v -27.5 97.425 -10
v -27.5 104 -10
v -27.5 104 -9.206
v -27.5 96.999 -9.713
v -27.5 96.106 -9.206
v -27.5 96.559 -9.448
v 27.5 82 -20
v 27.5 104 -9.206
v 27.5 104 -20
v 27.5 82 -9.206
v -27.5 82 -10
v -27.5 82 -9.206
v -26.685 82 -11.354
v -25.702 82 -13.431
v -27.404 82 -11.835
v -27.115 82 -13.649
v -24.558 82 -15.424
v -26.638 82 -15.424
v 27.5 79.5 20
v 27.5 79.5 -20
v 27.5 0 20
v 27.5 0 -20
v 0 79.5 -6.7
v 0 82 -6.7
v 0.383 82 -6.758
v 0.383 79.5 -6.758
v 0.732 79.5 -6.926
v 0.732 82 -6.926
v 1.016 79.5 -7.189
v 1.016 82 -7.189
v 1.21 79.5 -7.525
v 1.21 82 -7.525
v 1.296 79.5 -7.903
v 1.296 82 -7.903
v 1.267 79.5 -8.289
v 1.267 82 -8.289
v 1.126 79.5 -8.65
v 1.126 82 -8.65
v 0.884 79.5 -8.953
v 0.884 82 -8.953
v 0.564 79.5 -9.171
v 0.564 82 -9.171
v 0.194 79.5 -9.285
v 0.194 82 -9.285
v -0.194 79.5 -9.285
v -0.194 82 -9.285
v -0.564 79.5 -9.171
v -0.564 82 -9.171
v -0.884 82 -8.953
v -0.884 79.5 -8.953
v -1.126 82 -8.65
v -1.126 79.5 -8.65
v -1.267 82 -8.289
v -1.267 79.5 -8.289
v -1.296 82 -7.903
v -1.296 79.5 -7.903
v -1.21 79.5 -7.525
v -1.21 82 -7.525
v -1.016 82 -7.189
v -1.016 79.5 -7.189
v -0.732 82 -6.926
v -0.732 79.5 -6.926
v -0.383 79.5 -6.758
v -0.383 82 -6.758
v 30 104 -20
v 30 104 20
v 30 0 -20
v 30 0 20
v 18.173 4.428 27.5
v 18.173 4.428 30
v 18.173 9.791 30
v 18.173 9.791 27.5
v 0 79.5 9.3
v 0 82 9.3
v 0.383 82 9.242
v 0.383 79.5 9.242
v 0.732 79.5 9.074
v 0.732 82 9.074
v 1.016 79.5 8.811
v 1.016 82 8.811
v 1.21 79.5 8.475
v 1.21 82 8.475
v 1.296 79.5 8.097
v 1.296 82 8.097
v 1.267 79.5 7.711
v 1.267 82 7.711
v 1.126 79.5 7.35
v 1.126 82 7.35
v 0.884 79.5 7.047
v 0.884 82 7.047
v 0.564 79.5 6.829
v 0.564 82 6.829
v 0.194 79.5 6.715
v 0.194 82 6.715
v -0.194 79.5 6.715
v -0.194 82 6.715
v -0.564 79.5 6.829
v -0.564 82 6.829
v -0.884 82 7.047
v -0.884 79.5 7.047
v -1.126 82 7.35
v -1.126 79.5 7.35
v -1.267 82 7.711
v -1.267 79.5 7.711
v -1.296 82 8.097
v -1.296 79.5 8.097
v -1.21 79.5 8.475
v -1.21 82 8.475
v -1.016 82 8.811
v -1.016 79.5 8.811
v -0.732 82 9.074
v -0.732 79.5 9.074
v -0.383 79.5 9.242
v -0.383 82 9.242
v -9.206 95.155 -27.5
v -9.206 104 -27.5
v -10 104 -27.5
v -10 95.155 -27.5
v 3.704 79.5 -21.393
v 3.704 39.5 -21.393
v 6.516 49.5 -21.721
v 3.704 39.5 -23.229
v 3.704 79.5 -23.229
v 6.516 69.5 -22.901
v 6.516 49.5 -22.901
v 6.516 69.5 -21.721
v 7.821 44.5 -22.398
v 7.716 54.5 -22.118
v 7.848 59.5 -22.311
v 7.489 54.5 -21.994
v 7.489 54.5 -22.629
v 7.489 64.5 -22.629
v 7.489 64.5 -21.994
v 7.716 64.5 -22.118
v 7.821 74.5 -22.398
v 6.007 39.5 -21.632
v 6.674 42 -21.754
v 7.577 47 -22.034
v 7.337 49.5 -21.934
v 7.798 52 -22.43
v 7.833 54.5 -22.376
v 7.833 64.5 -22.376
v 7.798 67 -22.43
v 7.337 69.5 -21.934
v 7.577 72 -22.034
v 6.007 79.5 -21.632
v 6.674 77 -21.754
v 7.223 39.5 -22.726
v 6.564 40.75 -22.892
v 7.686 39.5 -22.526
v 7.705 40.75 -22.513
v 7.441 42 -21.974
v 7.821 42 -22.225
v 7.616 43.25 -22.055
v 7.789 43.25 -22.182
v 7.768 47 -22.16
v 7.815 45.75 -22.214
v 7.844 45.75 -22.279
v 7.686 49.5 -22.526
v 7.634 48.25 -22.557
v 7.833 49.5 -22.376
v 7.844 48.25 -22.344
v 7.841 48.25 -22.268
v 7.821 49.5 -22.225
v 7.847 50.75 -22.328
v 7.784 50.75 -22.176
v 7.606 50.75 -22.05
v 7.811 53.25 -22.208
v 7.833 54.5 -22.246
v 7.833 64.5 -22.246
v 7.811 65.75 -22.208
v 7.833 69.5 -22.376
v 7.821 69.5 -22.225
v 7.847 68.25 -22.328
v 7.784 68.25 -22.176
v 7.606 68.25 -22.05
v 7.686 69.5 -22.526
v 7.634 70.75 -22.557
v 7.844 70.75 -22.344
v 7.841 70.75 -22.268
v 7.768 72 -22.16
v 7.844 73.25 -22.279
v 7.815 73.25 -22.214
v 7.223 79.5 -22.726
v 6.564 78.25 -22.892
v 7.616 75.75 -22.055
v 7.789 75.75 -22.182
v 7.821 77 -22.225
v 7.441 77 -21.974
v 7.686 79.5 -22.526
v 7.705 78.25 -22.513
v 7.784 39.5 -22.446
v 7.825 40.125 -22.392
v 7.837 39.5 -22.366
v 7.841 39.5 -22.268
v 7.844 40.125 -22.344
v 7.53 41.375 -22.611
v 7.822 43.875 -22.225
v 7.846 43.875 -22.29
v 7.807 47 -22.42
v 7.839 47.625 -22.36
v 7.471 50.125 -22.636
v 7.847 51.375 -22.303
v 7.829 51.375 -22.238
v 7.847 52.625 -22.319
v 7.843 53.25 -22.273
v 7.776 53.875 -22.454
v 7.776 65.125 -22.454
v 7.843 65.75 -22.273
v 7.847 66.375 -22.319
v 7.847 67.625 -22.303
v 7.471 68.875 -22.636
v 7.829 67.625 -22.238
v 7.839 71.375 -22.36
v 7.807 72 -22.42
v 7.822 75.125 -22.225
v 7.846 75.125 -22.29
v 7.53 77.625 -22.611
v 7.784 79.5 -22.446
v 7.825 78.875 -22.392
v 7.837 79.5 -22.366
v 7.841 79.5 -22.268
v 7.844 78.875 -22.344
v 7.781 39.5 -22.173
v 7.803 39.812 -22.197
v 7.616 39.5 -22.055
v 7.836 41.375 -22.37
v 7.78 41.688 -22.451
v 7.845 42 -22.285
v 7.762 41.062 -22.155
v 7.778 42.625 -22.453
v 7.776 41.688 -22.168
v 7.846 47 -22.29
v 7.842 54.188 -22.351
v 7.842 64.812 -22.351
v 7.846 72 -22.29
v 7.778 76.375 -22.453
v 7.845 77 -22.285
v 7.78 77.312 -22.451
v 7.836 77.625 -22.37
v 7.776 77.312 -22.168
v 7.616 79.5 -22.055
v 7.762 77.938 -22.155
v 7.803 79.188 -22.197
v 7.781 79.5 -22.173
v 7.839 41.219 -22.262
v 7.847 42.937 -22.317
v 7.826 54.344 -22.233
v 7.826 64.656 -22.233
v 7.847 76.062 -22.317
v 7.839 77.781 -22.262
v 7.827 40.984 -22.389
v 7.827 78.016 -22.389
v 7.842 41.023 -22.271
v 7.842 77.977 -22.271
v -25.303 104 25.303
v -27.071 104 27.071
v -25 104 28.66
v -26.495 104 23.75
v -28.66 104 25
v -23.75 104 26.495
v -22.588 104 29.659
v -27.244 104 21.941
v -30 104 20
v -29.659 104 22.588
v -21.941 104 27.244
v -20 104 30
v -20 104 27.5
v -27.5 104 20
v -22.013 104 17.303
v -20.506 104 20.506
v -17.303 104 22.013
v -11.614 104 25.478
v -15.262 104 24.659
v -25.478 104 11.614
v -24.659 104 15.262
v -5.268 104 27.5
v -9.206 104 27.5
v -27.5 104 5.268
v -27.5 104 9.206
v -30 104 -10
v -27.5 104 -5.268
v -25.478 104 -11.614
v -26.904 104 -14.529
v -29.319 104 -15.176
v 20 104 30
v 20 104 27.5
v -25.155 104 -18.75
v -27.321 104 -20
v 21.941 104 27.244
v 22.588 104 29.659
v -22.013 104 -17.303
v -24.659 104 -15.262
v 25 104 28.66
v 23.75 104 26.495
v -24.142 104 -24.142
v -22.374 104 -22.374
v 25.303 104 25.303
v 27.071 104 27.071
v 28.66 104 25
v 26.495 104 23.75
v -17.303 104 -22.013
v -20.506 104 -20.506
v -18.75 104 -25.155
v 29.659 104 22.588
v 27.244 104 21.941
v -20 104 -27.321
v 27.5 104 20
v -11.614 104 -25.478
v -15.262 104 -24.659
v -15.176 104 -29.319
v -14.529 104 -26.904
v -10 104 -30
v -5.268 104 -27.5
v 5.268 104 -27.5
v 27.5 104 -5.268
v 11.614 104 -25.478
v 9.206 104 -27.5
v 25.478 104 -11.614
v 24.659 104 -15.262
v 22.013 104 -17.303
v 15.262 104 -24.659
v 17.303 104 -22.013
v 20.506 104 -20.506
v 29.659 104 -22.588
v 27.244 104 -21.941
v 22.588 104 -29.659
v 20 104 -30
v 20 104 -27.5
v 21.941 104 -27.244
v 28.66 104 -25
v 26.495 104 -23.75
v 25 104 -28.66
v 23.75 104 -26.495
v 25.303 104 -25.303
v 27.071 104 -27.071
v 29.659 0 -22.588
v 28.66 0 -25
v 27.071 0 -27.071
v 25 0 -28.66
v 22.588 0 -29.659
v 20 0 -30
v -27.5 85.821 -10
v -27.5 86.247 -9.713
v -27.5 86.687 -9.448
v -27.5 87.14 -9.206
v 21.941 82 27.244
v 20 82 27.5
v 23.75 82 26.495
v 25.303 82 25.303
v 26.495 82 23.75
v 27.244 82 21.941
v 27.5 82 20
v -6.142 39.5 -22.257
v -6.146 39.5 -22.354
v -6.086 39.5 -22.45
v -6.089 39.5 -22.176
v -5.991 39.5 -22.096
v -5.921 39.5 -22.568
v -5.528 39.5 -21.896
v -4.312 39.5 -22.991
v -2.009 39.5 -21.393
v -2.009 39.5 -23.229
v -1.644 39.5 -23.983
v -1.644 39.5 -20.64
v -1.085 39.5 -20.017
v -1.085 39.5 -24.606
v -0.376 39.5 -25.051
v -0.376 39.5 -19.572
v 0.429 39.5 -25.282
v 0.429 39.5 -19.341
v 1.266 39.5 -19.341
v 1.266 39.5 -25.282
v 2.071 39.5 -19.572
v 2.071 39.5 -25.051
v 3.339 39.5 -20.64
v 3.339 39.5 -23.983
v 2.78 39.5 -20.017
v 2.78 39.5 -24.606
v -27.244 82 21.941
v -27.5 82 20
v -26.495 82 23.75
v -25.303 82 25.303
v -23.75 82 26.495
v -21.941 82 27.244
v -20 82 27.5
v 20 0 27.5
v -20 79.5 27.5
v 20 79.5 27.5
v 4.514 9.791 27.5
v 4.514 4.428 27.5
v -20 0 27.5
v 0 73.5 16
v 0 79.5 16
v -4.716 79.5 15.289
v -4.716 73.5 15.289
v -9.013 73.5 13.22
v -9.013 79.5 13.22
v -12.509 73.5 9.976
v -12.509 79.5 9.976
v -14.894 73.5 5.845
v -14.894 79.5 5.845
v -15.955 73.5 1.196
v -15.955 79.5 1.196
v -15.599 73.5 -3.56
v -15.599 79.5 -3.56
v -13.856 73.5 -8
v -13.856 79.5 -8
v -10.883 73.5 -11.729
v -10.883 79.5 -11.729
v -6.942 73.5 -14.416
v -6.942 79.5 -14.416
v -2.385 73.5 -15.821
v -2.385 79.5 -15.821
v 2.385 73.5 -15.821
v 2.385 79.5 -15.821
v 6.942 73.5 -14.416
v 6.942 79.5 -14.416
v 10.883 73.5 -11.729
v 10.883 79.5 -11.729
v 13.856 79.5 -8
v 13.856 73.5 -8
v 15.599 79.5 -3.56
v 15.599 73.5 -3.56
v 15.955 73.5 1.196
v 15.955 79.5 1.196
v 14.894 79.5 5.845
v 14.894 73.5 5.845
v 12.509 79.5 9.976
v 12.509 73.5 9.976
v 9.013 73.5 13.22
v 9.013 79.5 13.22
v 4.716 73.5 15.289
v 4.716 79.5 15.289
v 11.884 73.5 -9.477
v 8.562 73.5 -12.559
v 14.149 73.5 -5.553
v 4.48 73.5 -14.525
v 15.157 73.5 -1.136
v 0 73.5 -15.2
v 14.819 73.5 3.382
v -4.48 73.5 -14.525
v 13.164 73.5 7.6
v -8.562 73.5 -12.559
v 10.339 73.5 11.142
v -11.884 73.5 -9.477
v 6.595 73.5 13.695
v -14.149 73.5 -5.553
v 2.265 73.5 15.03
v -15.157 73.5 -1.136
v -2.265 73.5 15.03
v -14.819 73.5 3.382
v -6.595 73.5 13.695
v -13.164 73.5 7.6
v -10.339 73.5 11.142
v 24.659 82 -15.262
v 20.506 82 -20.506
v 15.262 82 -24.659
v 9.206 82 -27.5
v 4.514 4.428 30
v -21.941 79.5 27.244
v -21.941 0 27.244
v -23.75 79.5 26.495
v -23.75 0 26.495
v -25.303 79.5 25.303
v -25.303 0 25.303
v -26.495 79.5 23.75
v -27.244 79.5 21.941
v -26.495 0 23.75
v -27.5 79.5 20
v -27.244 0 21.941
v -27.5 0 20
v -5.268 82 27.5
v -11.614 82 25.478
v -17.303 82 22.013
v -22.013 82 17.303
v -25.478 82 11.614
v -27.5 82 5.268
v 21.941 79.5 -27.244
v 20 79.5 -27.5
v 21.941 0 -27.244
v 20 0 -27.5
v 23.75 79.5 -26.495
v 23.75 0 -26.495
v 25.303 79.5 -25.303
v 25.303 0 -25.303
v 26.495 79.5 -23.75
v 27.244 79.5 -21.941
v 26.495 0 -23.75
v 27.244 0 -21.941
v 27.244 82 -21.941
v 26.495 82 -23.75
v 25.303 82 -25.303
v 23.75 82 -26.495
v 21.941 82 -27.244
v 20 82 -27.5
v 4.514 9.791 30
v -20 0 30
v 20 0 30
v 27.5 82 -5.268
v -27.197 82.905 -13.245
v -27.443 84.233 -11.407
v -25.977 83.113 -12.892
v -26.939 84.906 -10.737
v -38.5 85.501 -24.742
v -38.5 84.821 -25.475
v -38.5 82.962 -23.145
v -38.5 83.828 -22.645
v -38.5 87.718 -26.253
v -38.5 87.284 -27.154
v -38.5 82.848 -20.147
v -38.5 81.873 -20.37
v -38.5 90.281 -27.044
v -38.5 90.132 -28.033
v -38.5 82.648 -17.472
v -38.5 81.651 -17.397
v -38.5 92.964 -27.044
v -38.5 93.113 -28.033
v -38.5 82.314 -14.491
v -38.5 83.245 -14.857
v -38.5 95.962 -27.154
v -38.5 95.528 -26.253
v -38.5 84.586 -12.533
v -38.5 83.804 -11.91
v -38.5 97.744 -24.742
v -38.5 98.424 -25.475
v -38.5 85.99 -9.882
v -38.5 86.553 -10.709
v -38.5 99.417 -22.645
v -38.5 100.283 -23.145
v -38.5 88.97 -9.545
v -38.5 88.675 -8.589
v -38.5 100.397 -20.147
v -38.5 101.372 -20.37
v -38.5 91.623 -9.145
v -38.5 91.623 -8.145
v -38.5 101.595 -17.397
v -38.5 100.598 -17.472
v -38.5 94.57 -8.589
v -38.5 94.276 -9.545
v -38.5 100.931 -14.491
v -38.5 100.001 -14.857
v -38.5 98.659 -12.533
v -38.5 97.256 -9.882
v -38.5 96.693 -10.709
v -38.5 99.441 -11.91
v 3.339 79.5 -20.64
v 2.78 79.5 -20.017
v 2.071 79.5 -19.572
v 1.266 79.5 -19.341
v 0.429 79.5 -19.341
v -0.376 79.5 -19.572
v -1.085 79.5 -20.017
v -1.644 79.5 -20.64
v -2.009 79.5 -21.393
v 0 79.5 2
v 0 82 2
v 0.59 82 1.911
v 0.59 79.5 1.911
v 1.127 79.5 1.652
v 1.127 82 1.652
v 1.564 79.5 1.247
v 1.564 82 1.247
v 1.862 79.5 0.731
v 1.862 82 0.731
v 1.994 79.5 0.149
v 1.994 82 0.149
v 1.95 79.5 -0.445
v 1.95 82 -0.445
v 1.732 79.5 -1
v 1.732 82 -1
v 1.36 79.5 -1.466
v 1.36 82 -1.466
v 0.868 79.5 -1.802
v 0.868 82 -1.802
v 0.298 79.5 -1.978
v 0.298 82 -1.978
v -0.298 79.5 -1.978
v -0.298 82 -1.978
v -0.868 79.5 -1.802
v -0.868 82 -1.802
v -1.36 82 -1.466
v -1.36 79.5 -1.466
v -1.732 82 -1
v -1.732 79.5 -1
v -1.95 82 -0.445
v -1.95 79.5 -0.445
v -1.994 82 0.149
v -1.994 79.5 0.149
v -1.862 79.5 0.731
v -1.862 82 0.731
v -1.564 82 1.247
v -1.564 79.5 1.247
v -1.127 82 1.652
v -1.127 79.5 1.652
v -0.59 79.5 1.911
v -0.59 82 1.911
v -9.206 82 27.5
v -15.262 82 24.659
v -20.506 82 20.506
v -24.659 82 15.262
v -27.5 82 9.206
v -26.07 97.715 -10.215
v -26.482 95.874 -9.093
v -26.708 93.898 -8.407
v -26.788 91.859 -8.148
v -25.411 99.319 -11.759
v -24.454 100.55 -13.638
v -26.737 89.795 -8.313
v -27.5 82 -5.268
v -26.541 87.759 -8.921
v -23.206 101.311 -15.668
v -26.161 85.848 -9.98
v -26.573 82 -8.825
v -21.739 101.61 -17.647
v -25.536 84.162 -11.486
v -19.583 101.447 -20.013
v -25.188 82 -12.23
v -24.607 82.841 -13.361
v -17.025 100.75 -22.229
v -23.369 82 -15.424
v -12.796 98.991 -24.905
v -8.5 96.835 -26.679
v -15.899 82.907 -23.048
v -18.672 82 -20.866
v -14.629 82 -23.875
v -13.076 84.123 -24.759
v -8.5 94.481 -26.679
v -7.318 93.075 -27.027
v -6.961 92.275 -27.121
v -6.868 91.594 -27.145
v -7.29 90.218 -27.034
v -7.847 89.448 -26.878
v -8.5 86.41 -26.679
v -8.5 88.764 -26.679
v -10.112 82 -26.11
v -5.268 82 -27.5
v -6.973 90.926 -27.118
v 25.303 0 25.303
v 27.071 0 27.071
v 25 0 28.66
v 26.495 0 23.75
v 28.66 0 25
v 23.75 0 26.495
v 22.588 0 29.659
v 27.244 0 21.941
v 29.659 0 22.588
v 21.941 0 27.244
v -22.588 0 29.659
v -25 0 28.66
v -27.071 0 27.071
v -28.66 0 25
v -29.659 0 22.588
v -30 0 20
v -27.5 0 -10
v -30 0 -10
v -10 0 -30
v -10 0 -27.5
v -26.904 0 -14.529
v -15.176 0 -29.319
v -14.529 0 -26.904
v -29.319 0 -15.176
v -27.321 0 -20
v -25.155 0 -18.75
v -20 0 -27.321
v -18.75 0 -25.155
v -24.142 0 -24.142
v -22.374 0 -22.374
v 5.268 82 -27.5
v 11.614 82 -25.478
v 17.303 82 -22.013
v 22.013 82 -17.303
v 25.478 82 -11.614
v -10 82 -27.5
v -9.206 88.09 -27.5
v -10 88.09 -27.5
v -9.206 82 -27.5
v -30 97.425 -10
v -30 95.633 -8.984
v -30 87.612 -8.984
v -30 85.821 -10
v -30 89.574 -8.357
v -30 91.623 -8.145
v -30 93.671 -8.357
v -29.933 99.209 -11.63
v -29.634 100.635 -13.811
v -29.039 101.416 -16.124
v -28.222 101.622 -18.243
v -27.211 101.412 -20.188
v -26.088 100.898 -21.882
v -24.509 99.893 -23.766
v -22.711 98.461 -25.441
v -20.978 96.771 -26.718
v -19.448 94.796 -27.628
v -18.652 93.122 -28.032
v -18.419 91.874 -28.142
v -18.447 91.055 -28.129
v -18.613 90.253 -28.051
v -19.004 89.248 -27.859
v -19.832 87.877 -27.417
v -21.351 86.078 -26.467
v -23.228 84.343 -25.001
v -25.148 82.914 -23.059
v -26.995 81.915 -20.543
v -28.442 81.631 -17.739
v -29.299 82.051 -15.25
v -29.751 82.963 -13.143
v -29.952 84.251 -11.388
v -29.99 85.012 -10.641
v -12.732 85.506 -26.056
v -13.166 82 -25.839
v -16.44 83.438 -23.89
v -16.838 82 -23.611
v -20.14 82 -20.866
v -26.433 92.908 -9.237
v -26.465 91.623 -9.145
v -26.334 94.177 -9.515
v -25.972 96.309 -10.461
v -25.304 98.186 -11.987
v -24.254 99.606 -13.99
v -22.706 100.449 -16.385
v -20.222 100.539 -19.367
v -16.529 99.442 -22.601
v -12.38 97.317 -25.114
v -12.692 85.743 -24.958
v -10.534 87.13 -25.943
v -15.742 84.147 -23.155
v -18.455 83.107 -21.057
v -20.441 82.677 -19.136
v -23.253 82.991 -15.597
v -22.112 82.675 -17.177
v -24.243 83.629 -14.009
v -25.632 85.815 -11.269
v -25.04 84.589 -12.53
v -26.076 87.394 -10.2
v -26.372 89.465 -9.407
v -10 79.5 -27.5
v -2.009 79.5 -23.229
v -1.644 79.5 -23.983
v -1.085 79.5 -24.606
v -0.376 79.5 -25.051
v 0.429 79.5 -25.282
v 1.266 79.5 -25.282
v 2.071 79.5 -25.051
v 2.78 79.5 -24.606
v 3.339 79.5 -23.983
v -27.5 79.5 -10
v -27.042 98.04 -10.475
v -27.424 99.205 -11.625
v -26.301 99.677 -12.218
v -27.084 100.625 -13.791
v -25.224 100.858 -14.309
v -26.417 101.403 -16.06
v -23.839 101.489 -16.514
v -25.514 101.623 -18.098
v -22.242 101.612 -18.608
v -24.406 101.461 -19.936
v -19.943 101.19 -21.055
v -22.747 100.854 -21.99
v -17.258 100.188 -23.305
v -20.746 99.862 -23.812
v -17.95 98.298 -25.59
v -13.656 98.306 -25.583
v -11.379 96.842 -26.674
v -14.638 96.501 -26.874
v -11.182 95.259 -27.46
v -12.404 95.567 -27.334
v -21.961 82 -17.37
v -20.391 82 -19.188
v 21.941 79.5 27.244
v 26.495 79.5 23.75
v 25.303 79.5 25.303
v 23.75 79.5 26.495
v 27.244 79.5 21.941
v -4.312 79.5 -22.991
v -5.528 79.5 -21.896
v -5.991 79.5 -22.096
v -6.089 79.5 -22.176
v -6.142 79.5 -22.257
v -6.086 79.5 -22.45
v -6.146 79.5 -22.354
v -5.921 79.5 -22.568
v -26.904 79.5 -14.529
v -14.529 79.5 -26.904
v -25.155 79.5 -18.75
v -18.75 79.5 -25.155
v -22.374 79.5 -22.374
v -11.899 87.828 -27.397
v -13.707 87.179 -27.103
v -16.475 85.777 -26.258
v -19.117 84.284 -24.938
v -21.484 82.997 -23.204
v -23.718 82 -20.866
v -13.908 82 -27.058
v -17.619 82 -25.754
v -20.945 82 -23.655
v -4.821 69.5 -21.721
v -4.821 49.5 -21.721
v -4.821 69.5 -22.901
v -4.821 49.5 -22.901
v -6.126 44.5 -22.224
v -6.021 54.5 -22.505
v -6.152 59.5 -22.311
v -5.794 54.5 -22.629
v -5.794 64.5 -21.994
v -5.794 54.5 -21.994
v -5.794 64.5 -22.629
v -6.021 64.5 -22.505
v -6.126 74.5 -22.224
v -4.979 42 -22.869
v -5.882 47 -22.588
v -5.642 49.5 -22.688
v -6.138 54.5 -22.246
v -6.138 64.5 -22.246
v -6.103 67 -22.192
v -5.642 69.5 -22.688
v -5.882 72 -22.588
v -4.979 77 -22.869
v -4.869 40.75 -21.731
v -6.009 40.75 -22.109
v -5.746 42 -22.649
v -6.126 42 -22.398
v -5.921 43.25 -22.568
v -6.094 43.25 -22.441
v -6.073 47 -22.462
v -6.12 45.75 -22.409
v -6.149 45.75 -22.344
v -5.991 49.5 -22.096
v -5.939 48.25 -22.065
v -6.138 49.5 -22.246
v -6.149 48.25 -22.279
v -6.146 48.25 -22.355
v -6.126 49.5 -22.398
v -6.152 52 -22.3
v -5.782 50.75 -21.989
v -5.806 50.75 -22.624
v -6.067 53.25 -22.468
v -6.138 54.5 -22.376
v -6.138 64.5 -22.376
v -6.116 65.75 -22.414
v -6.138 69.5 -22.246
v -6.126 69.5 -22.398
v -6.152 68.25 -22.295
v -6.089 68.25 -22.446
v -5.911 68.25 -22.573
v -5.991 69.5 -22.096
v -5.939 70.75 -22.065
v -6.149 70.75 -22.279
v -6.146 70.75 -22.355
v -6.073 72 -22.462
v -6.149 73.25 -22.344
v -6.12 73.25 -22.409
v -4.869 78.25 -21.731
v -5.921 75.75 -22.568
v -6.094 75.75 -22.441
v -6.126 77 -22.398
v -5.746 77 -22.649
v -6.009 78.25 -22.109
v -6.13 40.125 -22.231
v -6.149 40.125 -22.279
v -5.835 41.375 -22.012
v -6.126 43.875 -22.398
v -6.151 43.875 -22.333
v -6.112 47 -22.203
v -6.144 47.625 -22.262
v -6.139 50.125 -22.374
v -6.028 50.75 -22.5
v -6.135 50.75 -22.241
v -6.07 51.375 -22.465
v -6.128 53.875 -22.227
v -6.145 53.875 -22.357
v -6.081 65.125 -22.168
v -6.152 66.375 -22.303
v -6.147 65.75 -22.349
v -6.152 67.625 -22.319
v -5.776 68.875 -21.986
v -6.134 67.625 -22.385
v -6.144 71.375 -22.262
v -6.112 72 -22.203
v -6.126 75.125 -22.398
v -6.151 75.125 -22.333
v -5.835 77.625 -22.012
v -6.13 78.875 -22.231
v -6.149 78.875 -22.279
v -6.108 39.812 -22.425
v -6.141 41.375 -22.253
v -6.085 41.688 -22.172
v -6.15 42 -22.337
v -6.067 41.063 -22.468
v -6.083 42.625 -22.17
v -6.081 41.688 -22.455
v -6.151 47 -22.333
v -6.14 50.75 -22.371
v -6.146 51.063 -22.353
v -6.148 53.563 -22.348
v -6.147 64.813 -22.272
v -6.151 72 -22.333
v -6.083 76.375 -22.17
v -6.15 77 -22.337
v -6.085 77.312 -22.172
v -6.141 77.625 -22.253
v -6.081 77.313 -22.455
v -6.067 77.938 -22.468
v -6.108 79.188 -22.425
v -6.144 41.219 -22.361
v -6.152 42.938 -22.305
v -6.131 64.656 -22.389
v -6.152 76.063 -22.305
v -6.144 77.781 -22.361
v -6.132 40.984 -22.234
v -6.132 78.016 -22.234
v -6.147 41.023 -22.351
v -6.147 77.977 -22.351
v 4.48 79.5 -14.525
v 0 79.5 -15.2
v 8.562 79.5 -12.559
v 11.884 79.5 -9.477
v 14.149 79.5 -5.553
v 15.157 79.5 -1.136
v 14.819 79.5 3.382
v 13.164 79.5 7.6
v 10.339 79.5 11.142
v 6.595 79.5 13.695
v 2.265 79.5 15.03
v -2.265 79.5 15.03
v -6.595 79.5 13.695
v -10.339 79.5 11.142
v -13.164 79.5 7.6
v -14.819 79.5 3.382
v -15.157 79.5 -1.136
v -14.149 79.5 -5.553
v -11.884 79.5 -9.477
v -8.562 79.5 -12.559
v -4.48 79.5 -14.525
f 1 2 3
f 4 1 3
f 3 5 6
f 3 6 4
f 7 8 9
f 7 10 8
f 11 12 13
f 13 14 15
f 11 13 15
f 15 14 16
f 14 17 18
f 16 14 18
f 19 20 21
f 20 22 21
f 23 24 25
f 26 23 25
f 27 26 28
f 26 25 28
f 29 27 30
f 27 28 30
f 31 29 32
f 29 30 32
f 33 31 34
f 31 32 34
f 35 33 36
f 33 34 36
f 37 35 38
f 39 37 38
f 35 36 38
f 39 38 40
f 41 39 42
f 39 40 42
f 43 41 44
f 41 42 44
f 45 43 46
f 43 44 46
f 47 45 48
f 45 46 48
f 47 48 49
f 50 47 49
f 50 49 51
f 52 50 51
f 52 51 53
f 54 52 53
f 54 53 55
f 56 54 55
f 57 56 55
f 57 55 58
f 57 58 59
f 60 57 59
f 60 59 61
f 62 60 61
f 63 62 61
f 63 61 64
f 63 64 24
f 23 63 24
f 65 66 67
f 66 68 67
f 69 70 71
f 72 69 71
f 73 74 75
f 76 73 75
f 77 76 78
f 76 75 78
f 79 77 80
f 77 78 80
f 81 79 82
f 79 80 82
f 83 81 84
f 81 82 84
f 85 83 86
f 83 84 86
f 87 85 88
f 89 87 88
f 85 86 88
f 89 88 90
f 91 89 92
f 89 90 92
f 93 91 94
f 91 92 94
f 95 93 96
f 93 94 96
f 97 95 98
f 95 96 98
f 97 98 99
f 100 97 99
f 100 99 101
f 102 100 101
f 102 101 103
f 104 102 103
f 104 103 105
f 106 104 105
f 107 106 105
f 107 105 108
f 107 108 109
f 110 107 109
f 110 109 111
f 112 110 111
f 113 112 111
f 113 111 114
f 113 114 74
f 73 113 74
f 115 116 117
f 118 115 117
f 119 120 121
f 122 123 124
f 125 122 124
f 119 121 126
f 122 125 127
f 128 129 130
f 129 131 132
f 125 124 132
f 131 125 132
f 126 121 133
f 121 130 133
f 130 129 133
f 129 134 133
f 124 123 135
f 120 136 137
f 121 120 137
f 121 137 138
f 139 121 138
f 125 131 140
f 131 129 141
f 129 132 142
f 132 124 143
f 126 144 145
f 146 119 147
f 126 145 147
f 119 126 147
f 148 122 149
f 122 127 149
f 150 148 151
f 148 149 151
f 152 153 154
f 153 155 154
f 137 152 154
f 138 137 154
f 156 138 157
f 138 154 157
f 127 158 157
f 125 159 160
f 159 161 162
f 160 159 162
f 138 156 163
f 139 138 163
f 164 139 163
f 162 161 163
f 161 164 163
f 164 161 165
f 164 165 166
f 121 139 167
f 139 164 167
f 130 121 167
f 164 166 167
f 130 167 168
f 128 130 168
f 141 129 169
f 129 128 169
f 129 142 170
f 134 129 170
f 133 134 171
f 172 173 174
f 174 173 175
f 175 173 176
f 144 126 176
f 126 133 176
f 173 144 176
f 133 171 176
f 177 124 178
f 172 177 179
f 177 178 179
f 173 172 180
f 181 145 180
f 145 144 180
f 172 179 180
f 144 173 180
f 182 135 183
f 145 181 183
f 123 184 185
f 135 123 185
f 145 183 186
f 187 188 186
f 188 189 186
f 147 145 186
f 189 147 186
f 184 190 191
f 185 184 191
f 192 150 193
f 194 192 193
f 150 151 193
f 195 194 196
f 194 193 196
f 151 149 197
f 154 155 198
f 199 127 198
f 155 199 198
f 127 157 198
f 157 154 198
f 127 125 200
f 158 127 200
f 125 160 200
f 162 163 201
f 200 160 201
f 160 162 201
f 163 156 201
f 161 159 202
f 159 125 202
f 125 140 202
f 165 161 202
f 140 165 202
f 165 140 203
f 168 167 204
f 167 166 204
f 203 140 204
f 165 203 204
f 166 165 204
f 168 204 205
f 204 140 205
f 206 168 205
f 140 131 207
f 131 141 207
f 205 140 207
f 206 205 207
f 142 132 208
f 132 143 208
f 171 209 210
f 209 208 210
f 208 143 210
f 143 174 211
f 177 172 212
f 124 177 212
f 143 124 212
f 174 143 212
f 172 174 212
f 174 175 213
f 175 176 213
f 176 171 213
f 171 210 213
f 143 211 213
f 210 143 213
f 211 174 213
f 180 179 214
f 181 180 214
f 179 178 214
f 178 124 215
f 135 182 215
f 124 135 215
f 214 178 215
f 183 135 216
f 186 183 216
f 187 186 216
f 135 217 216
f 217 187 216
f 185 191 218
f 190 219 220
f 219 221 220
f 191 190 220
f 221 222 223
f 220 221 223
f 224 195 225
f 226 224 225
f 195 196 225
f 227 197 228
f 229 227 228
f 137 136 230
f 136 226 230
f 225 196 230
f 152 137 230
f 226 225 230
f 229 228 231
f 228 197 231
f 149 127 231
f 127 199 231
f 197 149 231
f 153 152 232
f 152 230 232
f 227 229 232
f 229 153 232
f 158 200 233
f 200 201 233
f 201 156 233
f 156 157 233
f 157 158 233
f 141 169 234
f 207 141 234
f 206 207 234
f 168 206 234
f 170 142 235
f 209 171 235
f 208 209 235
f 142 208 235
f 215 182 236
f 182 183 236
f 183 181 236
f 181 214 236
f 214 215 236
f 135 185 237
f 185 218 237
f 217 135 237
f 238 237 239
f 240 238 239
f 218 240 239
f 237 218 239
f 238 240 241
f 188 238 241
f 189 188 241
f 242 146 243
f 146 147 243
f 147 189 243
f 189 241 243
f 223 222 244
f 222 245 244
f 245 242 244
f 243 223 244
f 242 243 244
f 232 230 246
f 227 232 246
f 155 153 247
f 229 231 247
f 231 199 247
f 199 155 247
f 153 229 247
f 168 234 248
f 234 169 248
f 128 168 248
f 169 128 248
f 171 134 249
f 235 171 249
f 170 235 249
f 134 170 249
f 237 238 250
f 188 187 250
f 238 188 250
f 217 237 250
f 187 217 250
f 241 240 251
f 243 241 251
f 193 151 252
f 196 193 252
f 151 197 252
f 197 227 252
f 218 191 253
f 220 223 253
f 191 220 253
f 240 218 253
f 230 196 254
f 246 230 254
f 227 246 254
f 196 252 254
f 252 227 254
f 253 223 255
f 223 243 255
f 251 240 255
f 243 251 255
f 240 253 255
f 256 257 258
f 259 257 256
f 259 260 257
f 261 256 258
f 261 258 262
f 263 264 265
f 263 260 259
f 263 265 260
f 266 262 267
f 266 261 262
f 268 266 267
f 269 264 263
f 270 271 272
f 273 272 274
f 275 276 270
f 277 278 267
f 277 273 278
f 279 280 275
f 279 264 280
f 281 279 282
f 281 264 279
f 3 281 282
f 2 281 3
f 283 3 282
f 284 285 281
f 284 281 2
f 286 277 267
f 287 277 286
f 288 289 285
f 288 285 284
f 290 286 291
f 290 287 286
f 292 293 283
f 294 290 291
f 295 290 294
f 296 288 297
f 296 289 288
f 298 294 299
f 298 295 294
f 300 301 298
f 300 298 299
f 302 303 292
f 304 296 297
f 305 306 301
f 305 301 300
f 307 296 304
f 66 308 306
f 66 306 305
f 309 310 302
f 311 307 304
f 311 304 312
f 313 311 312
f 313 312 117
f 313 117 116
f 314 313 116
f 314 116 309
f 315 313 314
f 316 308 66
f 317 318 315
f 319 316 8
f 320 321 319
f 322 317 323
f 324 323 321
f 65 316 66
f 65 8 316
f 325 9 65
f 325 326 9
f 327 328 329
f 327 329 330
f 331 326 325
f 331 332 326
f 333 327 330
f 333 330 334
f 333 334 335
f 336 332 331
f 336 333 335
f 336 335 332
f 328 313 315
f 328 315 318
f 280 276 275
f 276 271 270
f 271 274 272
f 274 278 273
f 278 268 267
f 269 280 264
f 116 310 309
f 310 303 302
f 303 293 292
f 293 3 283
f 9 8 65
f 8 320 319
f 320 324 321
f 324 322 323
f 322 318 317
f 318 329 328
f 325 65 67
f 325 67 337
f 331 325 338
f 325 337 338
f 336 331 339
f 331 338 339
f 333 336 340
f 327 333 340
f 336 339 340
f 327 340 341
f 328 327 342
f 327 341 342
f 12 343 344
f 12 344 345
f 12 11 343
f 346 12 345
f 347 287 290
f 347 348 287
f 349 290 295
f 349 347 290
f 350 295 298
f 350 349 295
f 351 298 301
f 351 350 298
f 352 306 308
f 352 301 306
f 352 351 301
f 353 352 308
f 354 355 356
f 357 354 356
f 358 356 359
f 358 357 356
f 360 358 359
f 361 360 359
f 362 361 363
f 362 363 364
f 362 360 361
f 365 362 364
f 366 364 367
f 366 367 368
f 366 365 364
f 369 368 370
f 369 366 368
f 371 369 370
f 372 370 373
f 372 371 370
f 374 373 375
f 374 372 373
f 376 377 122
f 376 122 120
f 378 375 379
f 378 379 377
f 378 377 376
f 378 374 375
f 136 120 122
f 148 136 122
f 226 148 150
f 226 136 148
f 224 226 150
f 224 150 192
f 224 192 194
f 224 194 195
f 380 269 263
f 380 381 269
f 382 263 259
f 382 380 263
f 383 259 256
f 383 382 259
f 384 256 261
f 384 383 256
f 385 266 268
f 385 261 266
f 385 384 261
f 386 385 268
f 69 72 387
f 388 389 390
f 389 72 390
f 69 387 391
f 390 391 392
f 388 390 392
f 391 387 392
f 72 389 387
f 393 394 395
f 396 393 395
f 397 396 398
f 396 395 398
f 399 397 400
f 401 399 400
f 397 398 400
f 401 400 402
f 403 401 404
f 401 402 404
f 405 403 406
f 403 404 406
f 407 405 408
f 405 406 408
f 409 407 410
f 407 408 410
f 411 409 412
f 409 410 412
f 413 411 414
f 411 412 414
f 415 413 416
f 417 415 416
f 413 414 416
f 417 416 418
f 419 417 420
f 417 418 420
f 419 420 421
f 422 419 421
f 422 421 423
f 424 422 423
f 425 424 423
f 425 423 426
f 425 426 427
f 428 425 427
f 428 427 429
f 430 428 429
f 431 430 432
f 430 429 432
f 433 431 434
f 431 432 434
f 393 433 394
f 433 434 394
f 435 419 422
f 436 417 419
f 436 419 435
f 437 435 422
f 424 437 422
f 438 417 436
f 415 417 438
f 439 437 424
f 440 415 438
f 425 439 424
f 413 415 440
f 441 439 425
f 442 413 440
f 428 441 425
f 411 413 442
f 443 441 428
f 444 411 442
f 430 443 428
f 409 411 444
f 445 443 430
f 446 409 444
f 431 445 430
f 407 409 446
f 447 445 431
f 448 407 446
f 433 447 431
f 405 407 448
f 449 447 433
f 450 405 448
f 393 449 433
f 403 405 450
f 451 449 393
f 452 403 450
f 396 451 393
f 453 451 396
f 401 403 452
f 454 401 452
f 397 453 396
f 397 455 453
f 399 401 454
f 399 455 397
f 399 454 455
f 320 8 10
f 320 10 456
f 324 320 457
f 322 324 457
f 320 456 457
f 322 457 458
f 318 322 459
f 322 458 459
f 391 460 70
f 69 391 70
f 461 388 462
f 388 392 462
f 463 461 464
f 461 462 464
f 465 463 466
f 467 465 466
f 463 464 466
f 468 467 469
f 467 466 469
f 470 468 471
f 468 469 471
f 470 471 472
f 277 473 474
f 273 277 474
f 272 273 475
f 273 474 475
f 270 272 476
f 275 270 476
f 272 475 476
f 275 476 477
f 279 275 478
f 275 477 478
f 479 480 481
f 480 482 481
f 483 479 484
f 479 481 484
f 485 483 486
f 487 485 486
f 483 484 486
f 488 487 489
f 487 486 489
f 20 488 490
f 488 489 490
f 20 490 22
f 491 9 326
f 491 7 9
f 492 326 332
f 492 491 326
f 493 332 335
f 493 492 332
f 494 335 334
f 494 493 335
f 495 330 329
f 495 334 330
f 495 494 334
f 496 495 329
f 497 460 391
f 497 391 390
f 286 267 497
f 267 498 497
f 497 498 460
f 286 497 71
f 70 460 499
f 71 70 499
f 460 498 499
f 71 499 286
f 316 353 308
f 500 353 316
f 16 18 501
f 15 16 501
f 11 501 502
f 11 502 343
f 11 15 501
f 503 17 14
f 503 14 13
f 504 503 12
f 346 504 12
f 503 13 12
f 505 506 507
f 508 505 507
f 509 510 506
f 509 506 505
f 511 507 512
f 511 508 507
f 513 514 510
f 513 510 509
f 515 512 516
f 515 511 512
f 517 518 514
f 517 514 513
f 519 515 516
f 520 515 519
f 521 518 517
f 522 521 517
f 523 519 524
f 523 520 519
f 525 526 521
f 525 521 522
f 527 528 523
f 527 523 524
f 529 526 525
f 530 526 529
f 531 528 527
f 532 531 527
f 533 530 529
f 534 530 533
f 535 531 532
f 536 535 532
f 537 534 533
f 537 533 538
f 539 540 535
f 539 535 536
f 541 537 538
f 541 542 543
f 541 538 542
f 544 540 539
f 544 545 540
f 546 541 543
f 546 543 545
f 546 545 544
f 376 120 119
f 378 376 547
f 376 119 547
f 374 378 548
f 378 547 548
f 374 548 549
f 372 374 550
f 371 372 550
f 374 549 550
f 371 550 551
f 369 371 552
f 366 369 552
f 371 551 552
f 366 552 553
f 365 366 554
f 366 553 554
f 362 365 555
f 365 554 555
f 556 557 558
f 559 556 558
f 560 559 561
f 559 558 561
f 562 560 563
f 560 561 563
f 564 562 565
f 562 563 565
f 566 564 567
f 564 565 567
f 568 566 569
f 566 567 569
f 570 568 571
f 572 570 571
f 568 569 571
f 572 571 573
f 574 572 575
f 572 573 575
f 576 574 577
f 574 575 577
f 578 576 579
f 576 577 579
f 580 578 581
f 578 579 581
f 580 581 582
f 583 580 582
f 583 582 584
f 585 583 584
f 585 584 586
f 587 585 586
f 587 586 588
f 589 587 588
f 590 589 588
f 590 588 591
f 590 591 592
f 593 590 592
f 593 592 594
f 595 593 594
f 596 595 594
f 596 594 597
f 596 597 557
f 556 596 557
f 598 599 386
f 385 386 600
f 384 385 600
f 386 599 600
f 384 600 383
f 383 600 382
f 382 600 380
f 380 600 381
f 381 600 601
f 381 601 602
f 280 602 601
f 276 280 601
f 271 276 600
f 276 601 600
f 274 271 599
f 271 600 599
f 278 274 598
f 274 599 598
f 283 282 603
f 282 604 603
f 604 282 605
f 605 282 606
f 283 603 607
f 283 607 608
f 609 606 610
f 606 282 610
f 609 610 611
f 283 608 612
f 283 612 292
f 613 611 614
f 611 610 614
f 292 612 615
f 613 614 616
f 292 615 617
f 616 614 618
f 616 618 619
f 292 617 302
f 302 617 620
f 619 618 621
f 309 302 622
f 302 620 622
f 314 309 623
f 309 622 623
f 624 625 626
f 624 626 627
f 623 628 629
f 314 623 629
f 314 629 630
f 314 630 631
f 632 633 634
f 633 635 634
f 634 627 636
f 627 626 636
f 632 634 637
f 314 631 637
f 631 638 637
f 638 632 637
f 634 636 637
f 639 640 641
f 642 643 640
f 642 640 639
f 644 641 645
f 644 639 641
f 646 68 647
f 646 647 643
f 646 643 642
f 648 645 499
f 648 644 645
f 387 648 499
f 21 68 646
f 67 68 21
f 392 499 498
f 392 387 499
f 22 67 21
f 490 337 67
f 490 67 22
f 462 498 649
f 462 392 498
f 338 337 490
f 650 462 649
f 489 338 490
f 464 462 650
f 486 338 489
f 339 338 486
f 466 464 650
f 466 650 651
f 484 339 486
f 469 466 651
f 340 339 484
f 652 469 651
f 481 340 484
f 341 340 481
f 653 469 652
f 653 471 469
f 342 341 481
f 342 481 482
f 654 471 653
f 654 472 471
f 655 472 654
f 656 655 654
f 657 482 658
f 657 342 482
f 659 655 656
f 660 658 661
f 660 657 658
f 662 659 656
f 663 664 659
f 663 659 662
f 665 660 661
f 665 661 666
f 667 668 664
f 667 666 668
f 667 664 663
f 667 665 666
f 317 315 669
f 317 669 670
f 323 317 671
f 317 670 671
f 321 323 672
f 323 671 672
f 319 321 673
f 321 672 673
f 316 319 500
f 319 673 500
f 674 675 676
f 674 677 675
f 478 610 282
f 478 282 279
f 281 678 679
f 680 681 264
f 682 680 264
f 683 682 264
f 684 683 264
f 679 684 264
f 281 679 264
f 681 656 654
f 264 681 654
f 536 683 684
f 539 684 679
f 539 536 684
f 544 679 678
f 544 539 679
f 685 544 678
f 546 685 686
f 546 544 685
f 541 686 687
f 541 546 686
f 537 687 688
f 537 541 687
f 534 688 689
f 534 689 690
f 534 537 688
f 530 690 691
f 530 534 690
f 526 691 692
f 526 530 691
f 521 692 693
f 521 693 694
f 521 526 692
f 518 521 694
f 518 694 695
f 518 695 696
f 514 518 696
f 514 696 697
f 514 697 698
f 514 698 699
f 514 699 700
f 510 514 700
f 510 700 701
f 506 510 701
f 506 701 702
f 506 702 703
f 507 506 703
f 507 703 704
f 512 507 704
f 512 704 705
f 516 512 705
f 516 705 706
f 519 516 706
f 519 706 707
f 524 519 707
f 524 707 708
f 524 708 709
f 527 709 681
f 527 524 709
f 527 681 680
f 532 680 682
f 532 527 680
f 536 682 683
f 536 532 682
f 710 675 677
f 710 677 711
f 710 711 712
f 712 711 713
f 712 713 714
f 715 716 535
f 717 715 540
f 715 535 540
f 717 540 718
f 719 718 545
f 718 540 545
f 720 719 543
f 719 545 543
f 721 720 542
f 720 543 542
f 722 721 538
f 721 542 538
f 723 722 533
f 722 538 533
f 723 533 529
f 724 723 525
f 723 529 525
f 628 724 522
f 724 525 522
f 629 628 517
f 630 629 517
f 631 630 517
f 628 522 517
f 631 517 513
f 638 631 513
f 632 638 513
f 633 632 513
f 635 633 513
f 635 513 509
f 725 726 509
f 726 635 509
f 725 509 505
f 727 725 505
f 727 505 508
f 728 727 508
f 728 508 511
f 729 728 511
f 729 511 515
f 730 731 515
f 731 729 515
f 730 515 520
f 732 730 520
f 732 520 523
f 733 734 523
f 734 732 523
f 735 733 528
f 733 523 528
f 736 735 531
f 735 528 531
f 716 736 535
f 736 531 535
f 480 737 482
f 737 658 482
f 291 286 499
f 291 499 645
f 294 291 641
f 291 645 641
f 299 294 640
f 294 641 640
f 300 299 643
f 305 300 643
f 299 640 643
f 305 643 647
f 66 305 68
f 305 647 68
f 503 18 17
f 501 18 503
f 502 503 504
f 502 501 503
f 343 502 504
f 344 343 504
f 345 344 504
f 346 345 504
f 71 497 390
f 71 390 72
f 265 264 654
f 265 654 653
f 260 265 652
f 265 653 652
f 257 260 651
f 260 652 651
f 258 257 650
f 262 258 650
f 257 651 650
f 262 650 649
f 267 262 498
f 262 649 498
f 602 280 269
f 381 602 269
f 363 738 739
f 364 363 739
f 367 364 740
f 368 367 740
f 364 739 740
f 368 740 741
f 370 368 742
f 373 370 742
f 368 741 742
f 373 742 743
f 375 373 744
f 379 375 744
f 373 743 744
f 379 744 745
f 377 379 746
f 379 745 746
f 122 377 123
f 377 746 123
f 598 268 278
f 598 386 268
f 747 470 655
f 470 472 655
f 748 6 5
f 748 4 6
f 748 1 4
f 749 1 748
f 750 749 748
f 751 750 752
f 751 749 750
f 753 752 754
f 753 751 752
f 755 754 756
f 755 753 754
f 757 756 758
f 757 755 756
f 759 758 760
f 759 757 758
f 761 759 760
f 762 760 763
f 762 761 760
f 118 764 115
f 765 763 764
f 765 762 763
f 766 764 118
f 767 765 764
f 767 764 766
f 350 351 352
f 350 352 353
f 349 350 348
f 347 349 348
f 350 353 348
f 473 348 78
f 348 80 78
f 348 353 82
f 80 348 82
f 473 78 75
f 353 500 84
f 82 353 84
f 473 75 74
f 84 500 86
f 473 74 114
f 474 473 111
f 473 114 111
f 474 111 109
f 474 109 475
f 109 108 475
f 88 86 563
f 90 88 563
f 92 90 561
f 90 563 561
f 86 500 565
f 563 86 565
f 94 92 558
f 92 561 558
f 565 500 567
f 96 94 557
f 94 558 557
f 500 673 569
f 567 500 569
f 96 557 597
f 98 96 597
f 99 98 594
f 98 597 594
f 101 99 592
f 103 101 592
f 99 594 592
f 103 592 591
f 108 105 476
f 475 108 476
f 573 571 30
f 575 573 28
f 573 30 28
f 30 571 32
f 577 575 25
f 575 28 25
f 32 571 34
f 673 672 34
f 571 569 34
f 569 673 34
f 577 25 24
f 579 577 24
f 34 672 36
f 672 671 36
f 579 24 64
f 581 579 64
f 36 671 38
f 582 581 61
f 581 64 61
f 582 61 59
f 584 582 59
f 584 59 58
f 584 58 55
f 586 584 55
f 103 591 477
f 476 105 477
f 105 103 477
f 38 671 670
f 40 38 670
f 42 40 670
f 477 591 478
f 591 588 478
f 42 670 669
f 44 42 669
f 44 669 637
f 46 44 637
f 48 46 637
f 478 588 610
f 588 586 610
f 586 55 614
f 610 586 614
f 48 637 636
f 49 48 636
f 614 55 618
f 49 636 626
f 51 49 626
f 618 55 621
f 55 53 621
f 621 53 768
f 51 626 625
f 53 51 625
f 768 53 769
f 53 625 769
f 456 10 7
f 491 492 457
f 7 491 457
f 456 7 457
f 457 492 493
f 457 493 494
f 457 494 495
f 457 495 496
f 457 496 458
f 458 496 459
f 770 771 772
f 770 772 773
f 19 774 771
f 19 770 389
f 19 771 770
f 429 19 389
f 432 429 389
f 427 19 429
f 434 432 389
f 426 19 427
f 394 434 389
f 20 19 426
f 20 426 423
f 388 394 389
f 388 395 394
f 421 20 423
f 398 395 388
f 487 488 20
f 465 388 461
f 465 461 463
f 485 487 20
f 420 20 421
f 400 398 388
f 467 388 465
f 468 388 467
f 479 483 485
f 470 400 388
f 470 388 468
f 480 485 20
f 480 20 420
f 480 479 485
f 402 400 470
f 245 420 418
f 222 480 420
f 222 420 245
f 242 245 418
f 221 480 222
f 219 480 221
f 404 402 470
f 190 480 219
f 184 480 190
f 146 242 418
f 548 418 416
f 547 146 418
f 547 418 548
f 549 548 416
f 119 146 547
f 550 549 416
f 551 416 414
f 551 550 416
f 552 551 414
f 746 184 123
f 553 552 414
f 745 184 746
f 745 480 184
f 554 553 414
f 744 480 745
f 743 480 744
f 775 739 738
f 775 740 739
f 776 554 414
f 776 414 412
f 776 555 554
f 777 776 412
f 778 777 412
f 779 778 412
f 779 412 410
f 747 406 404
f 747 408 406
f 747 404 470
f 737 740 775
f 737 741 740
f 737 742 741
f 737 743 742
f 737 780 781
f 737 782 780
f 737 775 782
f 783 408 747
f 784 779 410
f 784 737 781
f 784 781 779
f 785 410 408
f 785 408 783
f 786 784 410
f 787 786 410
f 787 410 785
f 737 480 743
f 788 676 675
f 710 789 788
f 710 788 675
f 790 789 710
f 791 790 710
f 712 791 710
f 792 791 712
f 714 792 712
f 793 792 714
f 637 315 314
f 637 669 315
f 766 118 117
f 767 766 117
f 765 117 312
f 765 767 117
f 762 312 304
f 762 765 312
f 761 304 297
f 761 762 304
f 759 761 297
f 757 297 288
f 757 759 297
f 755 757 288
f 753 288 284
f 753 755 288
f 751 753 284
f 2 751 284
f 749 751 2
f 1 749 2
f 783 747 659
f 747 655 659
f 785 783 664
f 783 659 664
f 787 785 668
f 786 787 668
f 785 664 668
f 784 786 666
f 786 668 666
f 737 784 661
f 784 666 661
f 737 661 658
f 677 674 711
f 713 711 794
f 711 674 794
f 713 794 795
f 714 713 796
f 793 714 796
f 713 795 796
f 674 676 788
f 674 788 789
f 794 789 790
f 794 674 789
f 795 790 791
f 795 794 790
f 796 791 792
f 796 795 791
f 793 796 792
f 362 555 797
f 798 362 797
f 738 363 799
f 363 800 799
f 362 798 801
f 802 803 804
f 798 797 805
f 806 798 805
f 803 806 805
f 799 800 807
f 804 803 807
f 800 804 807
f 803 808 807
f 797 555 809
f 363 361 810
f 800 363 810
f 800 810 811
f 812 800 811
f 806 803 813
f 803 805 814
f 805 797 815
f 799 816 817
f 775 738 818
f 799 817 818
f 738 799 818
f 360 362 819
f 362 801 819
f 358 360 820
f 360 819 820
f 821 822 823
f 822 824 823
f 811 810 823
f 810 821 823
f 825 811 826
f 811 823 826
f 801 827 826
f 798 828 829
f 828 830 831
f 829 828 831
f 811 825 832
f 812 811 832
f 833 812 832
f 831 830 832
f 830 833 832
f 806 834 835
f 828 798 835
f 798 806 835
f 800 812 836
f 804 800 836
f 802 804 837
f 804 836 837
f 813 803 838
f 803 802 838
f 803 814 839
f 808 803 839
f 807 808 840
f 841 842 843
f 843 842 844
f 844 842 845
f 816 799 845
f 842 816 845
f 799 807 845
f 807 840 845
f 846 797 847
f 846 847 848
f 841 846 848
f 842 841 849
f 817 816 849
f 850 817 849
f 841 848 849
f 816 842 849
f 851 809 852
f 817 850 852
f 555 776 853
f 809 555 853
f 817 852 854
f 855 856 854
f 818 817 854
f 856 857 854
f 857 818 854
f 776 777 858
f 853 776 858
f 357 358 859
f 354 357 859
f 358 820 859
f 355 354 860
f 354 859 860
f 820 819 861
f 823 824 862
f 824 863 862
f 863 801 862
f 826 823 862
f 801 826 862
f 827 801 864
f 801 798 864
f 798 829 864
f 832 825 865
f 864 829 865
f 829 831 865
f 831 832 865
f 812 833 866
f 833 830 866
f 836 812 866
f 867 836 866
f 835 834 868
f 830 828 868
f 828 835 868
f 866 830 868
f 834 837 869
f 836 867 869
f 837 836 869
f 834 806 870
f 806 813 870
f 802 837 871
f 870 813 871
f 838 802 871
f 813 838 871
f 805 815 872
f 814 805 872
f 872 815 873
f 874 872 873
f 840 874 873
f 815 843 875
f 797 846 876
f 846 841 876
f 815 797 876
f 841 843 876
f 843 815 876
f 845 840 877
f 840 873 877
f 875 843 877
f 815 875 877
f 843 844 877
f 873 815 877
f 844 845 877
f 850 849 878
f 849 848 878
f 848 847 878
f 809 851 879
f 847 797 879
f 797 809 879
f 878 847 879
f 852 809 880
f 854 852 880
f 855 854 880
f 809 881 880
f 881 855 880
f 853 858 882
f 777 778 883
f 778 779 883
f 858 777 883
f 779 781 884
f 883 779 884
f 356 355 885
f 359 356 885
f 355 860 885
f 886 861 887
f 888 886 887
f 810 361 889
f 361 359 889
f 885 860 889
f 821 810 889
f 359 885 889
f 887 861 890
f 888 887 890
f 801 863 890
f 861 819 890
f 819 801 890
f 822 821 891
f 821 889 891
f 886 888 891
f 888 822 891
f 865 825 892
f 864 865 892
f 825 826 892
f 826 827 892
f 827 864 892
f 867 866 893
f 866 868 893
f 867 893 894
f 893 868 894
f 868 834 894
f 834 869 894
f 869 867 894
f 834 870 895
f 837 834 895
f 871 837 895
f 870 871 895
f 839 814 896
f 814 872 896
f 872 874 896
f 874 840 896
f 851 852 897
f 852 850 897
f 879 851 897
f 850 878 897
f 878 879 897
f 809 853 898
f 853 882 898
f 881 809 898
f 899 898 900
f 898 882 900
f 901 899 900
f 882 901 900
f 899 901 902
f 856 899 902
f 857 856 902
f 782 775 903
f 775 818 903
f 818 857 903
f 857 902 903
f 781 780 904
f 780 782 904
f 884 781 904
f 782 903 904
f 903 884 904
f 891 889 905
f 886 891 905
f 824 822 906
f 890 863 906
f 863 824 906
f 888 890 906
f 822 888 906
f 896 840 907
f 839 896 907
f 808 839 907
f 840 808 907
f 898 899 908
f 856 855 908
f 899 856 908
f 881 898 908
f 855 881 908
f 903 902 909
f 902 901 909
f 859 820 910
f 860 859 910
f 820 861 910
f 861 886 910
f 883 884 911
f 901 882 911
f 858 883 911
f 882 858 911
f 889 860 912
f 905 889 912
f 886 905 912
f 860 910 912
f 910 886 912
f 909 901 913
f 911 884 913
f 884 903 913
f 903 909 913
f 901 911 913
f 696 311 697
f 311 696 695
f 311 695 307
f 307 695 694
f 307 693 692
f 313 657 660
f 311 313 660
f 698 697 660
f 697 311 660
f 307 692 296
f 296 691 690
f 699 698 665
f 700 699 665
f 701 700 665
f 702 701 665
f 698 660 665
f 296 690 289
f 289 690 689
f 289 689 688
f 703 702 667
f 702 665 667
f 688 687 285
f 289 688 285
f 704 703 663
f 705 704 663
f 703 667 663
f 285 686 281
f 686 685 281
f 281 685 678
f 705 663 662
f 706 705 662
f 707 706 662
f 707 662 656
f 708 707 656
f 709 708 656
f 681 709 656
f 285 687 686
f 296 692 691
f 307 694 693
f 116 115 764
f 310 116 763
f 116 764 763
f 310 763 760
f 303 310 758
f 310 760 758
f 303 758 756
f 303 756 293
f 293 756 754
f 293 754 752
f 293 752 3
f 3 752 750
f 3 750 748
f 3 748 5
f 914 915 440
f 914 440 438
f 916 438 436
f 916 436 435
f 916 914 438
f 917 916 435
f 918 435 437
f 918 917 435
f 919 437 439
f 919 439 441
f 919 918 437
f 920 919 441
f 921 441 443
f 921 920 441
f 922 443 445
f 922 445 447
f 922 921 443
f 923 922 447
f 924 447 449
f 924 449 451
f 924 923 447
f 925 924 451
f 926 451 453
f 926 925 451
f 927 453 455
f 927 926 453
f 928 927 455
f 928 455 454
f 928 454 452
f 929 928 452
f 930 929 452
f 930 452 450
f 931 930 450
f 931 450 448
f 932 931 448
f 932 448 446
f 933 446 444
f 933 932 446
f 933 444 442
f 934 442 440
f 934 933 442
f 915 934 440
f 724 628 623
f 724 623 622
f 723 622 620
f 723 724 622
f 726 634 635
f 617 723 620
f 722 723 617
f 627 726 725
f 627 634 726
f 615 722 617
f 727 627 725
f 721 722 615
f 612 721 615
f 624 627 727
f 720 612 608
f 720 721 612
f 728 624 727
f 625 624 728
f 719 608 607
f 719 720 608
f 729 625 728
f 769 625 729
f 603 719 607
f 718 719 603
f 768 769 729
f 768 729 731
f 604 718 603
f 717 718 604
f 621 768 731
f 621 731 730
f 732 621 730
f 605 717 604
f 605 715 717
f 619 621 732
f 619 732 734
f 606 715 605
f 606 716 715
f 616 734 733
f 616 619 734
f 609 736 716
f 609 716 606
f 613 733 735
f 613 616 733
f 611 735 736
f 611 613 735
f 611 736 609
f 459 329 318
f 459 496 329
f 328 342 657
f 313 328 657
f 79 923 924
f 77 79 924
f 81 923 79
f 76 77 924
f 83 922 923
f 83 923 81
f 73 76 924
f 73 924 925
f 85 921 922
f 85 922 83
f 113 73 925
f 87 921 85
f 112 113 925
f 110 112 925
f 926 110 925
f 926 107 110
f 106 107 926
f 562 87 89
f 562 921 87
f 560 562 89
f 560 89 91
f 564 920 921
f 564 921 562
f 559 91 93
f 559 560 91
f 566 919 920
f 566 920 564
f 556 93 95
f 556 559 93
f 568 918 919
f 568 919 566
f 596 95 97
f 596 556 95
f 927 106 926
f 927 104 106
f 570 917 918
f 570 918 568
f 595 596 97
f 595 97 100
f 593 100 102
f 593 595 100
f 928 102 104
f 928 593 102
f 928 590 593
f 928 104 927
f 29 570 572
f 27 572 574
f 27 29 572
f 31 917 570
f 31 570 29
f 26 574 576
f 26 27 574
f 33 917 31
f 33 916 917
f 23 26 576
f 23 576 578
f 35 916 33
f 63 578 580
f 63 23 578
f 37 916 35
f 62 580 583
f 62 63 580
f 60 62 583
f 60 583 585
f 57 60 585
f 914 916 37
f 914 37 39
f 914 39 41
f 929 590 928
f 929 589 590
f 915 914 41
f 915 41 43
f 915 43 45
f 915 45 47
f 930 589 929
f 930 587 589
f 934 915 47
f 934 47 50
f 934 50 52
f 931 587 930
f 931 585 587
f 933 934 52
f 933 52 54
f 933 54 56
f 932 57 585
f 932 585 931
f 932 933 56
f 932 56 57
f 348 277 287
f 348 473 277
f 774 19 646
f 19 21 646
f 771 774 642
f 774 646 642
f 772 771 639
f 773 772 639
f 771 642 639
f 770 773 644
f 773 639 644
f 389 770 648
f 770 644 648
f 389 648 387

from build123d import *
from build123d.topology import SkipClean

# Parameters (mm, degrees)
BOSS_EXTRUDE1_DEPTH  = 82
SHELL1_T             = -2.5
BOSS_EXTRUDE2_DEPTH  = 22
SHELL2_T             = -2.5
BOSS_EXTRUDE7_DEPTH  = 22
SKETCH7_R            = 2
SKETCH7_R_2          = 1.3
CUT_EXTRUDE1_DEPTH   = 10
SKETCH8_R            = 16
SKETCH8_R_2          = 15.2
BOSS_EXTRUDE8_DEPTH  = 6
SKETCH10_R           = 10
SKETCH10_R_2         = 9
BOSS_EXTRUDE9_DEPTH  = 30
SKETCH13_R           = 9
CUT_EXTRUDE2_DEPTH   = 40
CUT_EXTRUDE3_START   = -22
CUT_EXTRUDE3_DEPTH   = 22
BOSS_EXTRUDE10_DEPTH = 40
SKETCH16_W           = 13.658631977
SKETCH16_H           = 5.363360903
CUT_EXTRUDE4_DEPTH   = 10


with BuildPart() as part:
    # Sketch2 → Boss-Extrude1 (new body)
    with BuildSketch(Plane(origin=(0, 0, 0), x_dir=(1, 0, 0), z_dir=(0, 1, 0))):
        with BuildLine():
            Line((-10, 30), (20, 30))
            ThreePointArc((20, 30), (27.071067812, 27.071067812), (30, 20))
            Line((30, 20), (30, -20))
            ThreePointArc((30, -20), (27.071067812, -27.071067812), (20, -30))
            Line((20, -30), (-20, -30))
            ThreePointArc((-20, -30), (-27.071067812, -27.071067812), (-30, -20))
            Line((-30, -20), (-30, 10))
            ThreePointArc((-30, 10), (-24.142135624, 24.142135624), (-10, 30))
        make_face()
    extrude(amount=BOSS_EXTRUDE1_DEPTH)

    # Shell1
    shell1_openings = [part.faces().sort_by_distance(p)[0] for p in [
        (0.462600785, 0, 0.462600785),
    ]]
    offset(amount=SHELL1_T, openings=shell1_openings, kind=Kind.INTERSECTION)

    # Sketch5 → Boss-Extrude2 (add)
    with BuildSketch(Plane(origin=(0, 82, 0), x_dir=(1, 0, 0), z_dir=(0, 1, 0))):
        with BuildLine():
            Line((-30, 10), (-30, -20))
            ThreePointArc((-30, -20), (-27.071067812, -27.071067812), (-20, -30))
            Line((-20, -30), (20, -30))
            ThreePointArc((20, -30), (27.071067812, -27.071067812), (30, -20))
            Line((30, -20), (30, 20))
            ThreePointArc((30, 20), (27.071067812, 27.071067812), (20, 30))
            Line((20, 30), (-10, 30))
            ThreePointArc((-10, 30), (-24.142135624, 24.142135624), (-30, 10))
        make_face()
    extrude(amount=BOSS_EXTRUDE2_DEPTH)

    # Shell2
    shell2_openings = [part.faces().sort_by_distance(p)[0] for p in [
        (0.462600785, 104, 0.462600785),
    ]]
    offset(amount=SHELL2_T, openings=shell2_openings, kind=Kind.INTERSECTION)

    # Sketch6 → Boss-Extrude7 (add)
    with BuildSketch(Plane(origin=(0, 82, 0), x_dir=(1, 0, 0), z_dir=(0, 1, 0))):
        with BuildLine():
            Line((-0.723225176, -28.990980414), (-0.698286377, -27.991291434))
            ThreePointArc((-0.698286377, -27.991291434), (-19.550549627, 20.044351056), (28, 0))
            Line((28, 0), (29, 0))
            ThreePointArc((29, 0), (-20.248783543, 20.760220737), (-0.723225176, -28.990980414))
        make_face()
    extrude(amount=BOSS_EXTRUDE7_DEPTH)

    # Sketch7 → Cut-Extrude1 (cut)
    with BuildSketch(Plane(origin=(0, 82, 0), x_dir=(1, 0, 0), z_dir=(0, 1, 0))):
        with Locations(Location((0, 0, 0), (0, 0, 270))):
            Circle(SKETCH7_R)
        with Locations(Location((0, 8, 0), (0, 0, 270))):
            Circle(SKETCH7_R_2)
        with Locations(Location((0, -8, 0), (0, 0, 270))):
            Circle(SKETCH7_R_2)
    extrude(amount=-CUT_EXTRUDE1_DEPTH, mode=Mode.SUBTRACT)

    # Sketch8 → Boss-Extrude8 (add)
    with BuildSketch(Plane.XZ.offset(-79.5)):
        with Locations(Location((0, 0, 0), (0, 0, 90))):
            Circle(SKETCH8_R)
        with Locations(Location((0, 0, 0), (0, 0, 270))):
            Circle(SKETCH8_R_2, mode=Mode.SUBTRACT)
    extrude(amount=BOSS_EXTRUDE8_DEPTH)

    # Sketch10 → Boss-Extrude9 (add)
    with BuildSketch(Plane.ZY.offset(38.5)):
        with Locations((-18.144716291, 91.6227209)):
            Circle(SKETCH10_R)
        with Locations((-18.144716291, 91.6227209)):
            Circle(SKETCH10_R_2, mode=Mode.SUBTRACT)
    extrude(amount=-BOSS_EXTRUDE9_DEPTH)

    # Sketch13 → Cut-Extrude2 (cut)
    with SkipClean():  # the faces are left unmerged after this step: merging them gives an invalid solid
        with BuildSketch(Plane.ZY.offset(38.5)):
            with Locations((-18.144716291, 91.6227209)):
                Circle(SKETCH13_R)
        extrude(amount=-CUT_EXTRUDE2_DEPTH, mode=Mode.SUBTRACT)

    # Sketch14 → Cut-Extrude3 (cut)
    with BuildSketch(Plane(origin=(0, 104, 0), x_dir=(1, 0, 0), z_dir=(0, 1, 0)).offset(CUT_EXTRUDE3_START)):
        with BuildLine():
            Line((-27.5, 5.267826876), (-27.5, -5.267826876))
            ThreePointArc((-27.5, -5.267826876), (-19.798989873, -19.798989873), (-5.267826876, -27.5))
            Line((-5.267826876, -27.5), (20, -27.5))
            ThreePointArc((20, -27.5), (25.303300859, -25.303300859), (27.5, -20))
            Line((27.5, -20), (27.5, 5.267826876))
            ThreePointArc((27.5, 5.267826876), (19.798989873, 19.798989873), (5.267826876, 27.5))
            Line((5.267826876, 27.5), (-5.267826876, 27.5))
            ThreePointArc((-5.267826876, 27.5), (-19.798989873, 19.798989873), (-27.5, 5.267826876))
        make_face()
    extrude(amount=CUT_EXTRUDE3_DEPTH, mode=Mode.SUBTRACT)

    # Sketch15 → Boss-Extrude10 (add)
    with BuildSketch(Plane.XZ.offset(-79.5)):
        with BuildLine():
            ThreePointArc((3.703635336, -21.393366311), (0.847507366, -19.311262287), (-2.008620603, -21.393366311))
            add(Edge.make_bspline(
                [(-2.008620603, -21.393366311), (-16.308586663, -22.311262287), (-2.008620603, -23.229158263)],
                knots=[5.132671367, 5.132671367, 5.132671367, 7.433699247, 7.433699247, 7.433699247], degree=2, weights=[1, 0.408018281, 1]))
            ThreePointArc((-2.008620603, -23.229158263), (0.847507366, -25.311262287), (3.703635336, -23.229158263))
            add(Edge.make_bspline(
                [(3.703635336, -23.229158263), (18.003601395, -22.311262287), (3.703635336, -21.393366311)],
                knots=[1.991078714, 1.991078714, 1.991078714, 4.292106593, 4.292106593, 4.292106593], degree=2, weights=[1, 0.408018281, 1]))
        make_face()
    extrude(amount=BOSS_EXTRUDE10_DEPTH)

    # Sketch16 → Cut-Extrude4 (cut)
    with BuildSketch(Plane.XY.offset(30)):
        with Locations((11.343210565, 7.109274004)):
            Rectangle(SKETCH16_W, SKETCH16_H)
    extrude(amount=-CUT_EXTRUDE4_DEPTH, mode=Mode.SUBTRACT)


solid = part.part
